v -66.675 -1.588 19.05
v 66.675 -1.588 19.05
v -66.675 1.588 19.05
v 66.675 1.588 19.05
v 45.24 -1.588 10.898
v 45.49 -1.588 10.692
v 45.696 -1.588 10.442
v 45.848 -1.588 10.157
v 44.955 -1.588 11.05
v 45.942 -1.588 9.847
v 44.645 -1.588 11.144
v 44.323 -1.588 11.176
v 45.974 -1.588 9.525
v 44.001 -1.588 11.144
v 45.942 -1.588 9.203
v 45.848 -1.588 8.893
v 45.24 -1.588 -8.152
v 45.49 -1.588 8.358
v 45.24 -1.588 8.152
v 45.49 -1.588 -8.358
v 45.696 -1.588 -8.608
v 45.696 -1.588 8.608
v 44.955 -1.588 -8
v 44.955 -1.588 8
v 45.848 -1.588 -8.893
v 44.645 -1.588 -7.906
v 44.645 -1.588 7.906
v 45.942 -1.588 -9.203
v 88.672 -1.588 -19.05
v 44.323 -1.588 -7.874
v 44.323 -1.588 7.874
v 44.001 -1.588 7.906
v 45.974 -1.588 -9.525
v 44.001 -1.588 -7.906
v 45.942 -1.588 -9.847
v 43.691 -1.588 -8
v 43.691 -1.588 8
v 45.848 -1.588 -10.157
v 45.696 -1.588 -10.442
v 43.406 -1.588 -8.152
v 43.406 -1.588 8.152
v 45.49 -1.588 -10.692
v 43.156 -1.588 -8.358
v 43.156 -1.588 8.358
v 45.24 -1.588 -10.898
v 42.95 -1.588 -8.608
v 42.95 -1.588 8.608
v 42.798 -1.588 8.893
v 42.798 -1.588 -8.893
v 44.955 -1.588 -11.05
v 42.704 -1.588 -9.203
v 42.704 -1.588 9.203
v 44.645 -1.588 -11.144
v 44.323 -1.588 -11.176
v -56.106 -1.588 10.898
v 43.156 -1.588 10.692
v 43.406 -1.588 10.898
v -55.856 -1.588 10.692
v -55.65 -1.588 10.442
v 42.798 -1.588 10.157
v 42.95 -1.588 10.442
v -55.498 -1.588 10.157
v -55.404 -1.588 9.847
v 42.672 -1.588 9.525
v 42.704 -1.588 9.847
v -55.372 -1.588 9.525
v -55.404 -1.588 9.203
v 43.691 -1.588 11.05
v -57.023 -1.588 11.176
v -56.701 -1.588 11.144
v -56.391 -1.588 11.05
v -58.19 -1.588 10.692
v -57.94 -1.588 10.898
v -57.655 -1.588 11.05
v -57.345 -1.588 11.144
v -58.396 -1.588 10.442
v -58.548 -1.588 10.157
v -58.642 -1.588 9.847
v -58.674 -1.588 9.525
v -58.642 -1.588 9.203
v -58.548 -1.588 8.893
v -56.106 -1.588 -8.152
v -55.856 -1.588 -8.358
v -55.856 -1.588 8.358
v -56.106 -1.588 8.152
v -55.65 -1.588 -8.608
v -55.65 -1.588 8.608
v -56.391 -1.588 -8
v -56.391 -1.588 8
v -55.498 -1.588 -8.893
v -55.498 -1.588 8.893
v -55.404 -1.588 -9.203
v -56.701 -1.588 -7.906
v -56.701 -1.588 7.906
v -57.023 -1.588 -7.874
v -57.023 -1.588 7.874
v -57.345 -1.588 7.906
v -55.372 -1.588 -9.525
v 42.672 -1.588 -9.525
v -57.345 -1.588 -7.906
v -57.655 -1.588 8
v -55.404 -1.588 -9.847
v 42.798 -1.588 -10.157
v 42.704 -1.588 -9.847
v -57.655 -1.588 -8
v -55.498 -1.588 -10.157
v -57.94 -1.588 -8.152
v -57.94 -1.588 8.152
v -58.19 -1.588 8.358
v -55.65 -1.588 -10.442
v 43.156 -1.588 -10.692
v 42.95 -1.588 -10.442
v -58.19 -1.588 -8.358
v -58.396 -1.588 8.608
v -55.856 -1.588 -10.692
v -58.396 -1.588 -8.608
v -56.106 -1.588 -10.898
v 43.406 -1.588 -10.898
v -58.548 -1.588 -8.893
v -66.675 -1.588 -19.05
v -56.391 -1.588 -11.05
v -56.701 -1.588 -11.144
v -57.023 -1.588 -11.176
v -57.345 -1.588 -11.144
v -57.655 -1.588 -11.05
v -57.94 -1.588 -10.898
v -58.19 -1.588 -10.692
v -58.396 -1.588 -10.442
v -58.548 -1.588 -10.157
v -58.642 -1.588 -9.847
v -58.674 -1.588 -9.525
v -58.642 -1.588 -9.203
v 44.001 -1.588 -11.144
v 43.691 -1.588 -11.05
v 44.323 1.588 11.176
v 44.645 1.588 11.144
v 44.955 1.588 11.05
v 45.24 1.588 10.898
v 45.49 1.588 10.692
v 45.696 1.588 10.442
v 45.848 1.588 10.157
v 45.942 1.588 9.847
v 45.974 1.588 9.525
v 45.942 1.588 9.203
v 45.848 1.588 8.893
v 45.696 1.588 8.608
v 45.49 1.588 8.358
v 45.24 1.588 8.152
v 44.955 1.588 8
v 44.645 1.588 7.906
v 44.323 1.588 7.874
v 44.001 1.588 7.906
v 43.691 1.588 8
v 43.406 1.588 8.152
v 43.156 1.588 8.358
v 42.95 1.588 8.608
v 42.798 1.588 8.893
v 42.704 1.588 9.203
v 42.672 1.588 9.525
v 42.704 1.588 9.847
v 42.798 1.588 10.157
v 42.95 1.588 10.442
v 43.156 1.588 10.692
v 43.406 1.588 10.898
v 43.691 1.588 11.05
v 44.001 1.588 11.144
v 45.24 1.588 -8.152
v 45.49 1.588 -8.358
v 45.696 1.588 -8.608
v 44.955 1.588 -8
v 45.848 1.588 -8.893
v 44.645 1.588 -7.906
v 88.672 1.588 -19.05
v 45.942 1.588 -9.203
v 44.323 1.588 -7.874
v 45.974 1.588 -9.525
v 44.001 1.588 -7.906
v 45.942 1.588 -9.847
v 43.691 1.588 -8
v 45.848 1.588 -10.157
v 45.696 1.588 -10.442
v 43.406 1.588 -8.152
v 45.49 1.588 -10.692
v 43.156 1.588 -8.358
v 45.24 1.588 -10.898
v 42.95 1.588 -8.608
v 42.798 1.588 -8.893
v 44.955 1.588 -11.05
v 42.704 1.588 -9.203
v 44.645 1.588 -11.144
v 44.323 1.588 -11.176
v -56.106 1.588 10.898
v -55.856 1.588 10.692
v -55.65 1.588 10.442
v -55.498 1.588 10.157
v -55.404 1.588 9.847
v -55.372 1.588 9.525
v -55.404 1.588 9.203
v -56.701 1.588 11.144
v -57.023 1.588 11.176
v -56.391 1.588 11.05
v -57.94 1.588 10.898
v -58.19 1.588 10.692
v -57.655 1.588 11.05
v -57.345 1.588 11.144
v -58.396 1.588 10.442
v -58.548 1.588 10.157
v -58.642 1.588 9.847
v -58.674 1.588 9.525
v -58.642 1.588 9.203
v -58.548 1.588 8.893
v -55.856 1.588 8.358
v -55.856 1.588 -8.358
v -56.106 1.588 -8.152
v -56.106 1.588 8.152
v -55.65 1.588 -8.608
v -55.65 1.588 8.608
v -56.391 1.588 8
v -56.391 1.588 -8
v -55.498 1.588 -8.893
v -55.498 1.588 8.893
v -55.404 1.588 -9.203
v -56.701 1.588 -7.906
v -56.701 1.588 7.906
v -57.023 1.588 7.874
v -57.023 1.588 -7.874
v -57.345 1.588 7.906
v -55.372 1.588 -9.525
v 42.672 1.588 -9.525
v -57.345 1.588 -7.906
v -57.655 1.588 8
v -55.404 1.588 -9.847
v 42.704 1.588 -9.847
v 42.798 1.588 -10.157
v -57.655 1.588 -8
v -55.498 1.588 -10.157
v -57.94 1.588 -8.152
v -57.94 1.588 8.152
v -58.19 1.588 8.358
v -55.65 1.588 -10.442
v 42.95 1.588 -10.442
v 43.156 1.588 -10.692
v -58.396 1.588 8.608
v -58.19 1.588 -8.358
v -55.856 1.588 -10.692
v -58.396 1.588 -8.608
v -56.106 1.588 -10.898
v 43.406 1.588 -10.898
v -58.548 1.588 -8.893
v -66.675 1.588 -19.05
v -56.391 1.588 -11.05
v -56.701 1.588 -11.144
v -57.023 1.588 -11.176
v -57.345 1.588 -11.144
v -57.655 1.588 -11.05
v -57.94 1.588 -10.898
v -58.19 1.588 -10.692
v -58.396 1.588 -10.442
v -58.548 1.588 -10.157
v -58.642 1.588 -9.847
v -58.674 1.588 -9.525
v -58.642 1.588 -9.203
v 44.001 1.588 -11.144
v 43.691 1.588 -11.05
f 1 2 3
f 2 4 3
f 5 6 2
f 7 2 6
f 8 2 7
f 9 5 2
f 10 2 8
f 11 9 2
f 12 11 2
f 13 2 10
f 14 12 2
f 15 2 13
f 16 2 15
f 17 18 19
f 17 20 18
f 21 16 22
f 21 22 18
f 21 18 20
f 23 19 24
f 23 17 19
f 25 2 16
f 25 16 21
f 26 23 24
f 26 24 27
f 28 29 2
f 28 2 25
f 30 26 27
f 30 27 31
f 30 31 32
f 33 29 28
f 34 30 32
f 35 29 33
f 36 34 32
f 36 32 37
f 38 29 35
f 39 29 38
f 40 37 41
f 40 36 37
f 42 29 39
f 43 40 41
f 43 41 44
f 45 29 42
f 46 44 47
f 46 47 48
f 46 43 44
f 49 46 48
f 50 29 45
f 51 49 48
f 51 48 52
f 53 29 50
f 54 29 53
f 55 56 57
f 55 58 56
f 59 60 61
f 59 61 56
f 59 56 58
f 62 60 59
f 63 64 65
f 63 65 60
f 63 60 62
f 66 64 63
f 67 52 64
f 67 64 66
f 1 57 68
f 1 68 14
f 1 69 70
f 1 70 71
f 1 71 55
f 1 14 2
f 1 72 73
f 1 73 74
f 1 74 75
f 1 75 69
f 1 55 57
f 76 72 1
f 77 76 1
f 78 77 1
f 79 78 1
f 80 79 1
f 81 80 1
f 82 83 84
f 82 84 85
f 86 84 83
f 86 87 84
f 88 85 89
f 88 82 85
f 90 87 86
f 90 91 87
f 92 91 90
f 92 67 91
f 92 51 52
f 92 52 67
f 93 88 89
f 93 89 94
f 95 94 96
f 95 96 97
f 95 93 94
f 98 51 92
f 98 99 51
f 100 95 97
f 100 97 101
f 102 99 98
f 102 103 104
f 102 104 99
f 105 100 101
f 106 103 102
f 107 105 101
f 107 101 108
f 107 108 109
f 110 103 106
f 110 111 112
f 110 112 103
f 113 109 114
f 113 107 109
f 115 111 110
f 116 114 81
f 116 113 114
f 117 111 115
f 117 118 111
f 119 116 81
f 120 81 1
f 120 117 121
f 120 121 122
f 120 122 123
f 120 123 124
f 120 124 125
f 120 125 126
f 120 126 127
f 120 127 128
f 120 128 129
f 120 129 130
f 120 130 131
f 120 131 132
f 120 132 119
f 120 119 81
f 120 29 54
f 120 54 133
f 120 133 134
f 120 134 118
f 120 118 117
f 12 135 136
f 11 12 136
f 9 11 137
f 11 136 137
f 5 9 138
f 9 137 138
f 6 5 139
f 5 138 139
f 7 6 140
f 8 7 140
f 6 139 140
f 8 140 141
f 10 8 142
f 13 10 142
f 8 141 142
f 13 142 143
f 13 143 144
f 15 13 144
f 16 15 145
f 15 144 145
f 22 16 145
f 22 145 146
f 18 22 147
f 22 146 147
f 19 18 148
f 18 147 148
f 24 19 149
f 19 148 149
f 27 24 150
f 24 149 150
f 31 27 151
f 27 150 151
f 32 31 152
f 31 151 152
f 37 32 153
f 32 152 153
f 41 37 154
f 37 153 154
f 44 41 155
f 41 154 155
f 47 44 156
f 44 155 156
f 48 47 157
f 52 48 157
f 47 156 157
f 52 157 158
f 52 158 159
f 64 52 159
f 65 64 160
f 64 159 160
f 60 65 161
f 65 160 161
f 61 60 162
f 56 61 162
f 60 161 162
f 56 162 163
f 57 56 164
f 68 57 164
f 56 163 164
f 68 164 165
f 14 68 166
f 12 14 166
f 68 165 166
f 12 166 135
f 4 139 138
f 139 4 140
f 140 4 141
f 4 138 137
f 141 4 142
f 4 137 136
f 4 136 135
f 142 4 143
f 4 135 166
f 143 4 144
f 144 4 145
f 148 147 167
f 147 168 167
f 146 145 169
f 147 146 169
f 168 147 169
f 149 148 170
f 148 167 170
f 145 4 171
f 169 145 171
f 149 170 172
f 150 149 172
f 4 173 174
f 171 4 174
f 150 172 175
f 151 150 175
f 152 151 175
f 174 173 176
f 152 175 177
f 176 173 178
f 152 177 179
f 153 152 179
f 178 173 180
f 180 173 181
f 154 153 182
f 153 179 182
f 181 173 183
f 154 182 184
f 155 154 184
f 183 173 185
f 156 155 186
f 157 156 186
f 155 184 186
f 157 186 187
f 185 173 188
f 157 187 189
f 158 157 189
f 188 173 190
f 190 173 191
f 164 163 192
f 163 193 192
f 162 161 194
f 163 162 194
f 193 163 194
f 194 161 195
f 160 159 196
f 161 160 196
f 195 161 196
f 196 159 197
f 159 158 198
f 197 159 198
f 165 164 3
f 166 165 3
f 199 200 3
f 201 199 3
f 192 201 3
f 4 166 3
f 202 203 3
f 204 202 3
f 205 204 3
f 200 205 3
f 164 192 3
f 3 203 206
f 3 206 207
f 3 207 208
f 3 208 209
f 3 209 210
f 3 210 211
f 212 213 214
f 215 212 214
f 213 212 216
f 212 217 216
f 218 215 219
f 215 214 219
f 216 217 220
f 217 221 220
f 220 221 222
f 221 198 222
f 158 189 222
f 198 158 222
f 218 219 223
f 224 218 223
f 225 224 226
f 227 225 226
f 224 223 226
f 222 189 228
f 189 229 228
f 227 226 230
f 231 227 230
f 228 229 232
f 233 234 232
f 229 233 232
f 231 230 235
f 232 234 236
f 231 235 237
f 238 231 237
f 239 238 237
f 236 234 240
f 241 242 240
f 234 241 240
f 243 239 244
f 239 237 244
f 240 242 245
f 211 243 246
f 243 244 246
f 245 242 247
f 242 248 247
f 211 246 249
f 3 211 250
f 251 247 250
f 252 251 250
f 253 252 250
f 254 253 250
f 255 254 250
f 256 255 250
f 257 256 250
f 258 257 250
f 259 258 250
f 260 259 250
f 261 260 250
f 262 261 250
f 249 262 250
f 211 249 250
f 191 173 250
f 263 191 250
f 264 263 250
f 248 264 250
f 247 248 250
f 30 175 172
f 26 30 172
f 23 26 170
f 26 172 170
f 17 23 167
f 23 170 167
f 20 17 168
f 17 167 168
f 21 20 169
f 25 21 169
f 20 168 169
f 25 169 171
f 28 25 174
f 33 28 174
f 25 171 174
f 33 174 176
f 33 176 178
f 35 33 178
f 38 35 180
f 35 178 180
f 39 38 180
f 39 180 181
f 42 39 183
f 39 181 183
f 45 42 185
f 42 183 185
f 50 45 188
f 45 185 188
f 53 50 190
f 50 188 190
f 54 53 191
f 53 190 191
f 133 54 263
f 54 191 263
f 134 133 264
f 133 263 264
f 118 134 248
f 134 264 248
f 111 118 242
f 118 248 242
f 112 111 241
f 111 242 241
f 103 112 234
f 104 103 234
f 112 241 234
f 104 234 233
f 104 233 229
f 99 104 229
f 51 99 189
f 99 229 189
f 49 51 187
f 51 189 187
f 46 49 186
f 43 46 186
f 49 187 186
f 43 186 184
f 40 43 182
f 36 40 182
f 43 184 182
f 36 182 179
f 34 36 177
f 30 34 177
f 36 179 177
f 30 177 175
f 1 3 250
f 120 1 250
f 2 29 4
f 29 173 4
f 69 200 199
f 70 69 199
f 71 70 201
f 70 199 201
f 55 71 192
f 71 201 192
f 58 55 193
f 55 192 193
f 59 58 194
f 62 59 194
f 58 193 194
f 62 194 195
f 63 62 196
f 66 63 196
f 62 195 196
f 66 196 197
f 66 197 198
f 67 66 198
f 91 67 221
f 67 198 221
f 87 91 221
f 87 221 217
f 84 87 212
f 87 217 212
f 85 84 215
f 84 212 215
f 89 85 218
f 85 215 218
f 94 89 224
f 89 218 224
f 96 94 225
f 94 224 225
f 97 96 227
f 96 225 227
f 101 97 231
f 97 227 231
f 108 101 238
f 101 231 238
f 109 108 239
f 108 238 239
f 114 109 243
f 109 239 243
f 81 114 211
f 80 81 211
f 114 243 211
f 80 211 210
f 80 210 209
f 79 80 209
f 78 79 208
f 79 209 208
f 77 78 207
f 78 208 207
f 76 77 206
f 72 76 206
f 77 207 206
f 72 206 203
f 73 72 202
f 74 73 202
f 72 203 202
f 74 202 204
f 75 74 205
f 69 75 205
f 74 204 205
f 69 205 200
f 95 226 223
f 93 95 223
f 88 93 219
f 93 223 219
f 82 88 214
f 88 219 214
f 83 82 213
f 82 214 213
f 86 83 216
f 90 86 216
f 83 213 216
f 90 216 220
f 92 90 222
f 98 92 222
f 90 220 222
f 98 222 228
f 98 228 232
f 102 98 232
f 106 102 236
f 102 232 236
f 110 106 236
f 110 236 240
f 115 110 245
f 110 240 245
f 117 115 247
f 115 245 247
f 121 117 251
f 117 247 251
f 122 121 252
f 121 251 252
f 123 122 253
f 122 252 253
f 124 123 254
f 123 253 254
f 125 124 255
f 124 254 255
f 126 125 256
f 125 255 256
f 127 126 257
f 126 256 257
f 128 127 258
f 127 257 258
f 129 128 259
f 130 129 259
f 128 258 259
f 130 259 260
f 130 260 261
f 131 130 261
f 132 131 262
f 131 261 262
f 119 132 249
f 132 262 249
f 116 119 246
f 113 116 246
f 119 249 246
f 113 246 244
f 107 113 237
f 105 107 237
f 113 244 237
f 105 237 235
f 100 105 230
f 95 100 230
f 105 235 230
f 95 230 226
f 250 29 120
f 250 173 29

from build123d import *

# Parameters (mm, degrees)
BOSS_EXTRUDE1_DEPTH = 1.5875
SKETCH2_R           = 1.651
CUT_EXTRUDE1_DEPTH  = 3.175


with BuildPart() as part:
    # Sketch1 → Boss-Extrude1 (new, symmetric)
    with BuildSketch(Plane(origin=(0, 0, 0), x_dir=(1, 0, 0), z_dir=(0, 1, 0))):
        Polygon((66.675, 19.05), (88.672045256, 19.05), (66.675, -19.05), (-66.675, -19.05), (-66.675, 19.05), align=None)
    extrude(amount=BOSS_EXTRUDE1_DEPTH, both=True)

    # Sketch2 → Cut-Extrude1 (cut)
    with BuildSketch(Plane(origin=(0, 1.5875, 0), x_dir=(1, 0, 0), z_dir=(0, 1, 0))):
        with Locations(Location((-57.023, 9.525, 0), (0, 0, 270))):
            Circle(SKETCH2_R)
        with Locations(Location((-57.023, -9.525, 0), (0, 0, 270))):
            Circle(SKETCH2_R)
        with Locations(Location((44.323, -9.525, 0), (0, 0, 270))):
            Circle(SKETCH2_R)
        with Locations(Location((44.323, 9.525, 0), (0, 0, 270))):
            Circle(SKETCH2_R)
    extrude(amount=-CUT_EXTRUDE1_DEPTH, mode=Mode.SUBTRACT)


solid = part.part
